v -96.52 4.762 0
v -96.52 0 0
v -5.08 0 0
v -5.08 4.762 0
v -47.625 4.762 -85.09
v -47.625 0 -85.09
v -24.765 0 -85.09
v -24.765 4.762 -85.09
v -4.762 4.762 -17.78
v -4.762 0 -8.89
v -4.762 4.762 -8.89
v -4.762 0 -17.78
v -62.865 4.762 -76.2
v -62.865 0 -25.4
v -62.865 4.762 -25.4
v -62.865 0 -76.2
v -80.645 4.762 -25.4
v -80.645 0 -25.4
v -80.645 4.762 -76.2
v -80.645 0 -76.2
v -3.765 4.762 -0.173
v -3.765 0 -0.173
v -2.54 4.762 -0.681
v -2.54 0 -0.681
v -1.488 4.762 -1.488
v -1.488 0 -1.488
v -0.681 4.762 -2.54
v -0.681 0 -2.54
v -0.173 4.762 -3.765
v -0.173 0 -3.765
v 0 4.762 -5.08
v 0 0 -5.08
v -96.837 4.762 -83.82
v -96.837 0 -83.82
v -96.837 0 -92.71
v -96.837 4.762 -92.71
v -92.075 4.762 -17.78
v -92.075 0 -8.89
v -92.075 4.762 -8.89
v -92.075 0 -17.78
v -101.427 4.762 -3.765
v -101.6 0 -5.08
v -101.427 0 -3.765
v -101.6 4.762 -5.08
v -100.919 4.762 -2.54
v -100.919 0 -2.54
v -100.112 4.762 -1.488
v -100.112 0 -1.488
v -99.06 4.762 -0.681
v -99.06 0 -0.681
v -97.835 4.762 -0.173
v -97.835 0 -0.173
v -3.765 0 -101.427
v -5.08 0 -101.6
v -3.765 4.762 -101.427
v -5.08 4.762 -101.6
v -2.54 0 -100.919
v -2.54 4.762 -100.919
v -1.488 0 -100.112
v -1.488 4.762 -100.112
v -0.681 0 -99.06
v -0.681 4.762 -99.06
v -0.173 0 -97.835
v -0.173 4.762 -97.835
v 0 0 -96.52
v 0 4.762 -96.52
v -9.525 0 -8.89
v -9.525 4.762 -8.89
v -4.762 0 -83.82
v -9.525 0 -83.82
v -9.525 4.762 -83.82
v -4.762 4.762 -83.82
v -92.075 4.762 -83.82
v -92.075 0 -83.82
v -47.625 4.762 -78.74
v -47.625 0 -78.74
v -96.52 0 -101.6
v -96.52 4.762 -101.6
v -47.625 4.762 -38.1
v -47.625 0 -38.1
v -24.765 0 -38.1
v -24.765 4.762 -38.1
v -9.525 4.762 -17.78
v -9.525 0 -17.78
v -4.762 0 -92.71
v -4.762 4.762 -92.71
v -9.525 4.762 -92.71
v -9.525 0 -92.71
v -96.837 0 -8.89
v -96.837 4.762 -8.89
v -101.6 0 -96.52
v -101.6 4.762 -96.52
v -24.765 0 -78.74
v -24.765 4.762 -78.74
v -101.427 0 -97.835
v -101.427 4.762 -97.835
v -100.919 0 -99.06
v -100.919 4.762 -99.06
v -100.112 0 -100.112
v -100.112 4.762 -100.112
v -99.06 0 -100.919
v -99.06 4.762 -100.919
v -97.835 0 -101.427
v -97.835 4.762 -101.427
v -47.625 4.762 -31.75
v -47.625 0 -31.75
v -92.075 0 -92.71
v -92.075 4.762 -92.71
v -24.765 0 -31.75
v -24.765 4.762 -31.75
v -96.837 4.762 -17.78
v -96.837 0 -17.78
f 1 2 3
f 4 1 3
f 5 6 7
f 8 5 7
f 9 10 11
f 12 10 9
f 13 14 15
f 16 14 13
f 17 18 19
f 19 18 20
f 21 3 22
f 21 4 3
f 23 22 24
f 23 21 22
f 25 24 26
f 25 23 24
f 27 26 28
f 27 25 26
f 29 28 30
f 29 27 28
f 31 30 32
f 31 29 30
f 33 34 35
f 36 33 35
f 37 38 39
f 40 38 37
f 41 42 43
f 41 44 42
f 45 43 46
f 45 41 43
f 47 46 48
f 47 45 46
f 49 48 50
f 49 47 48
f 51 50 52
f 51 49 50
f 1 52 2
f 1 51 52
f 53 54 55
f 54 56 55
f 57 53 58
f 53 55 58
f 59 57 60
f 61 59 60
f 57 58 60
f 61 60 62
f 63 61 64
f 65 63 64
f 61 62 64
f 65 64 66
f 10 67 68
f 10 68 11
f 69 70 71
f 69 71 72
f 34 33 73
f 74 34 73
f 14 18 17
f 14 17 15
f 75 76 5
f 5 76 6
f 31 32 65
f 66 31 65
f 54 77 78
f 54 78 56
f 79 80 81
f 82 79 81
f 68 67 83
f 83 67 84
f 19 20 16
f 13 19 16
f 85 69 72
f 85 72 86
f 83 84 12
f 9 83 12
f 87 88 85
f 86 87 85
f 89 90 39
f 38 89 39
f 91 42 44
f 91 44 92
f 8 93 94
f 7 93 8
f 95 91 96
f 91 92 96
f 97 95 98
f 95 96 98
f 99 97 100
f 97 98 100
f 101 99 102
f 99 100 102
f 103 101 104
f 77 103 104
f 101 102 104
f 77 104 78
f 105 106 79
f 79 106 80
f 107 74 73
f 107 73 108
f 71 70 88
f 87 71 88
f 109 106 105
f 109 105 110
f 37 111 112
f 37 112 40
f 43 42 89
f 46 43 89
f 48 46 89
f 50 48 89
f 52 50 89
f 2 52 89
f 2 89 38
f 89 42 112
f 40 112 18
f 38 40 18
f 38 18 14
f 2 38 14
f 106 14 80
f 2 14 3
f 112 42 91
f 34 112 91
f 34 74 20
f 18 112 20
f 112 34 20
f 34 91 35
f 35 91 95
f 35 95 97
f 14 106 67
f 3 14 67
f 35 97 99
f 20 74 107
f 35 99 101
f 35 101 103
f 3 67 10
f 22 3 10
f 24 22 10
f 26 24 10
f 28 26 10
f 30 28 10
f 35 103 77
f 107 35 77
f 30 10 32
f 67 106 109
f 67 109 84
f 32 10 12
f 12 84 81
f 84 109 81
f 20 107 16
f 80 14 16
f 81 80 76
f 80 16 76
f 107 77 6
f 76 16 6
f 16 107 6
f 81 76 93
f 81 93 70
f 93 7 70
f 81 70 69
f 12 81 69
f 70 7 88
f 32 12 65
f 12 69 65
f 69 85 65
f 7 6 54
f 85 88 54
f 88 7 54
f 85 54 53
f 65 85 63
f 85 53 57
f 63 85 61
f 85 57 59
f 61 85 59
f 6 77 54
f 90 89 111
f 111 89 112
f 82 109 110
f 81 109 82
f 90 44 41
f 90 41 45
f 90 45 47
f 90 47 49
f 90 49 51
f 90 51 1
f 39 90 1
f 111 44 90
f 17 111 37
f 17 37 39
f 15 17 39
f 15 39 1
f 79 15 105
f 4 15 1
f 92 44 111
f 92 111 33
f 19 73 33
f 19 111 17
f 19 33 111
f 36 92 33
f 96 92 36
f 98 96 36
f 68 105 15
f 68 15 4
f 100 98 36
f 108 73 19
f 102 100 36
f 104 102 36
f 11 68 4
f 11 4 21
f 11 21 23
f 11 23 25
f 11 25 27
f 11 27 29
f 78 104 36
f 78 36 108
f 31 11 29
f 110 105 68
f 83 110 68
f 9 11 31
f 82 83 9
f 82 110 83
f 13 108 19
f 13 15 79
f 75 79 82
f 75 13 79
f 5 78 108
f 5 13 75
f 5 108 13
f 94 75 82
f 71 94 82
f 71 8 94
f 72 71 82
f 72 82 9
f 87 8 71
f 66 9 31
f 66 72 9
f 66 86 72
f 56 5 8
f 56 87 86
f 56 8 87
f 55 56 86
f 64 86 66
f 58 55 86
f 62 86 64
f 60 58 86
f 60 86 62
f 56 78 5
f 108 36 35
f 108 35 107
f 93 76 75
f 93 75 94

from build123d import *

# Parameters (mm, degrees)
SKETCH1_W           = 101.6
SKETCH1_H           = 101.6
SKETCH1_W_2         = 4.7625
SKETCH1_H_2         = 8.89
SKETCH1_W_3         = 17.78
SKETCH1_H_3         = 50.8
SKETCH1_W_4         = 22.86
SKETCH1_H_4         = 6.35
BOSS_EXTRUDE1_DEPTH = 4.7625
FILLET1_R           = 5.08


with BuildPart() as part:
    # Sketch1 → Boss-Extrude1 (new body)
    with BuildSketch(Plane(origin=(0, 0, 0), x_dir=(1, 0, 0), z_dir=(0, 1, 0))):
        with Locations((-50.8, 50.8)):
            Rectangle(SKETCH1_W, SKETCH1_H)
        with Locations((-94.45625, 13.335)):
            Rectangle(SKETCH1_W_2, SKETCH1_H_2, mode=Mode.SUBTRACT)
        with Locations((-94.45625, 88.265)):
            Rectangle(SKETCH1_W_2, SKETCH1_H_2, mode=Mode.SUBTRACT)
        with Locations((-71.755, 50.8)):
            Rectangle(SKETCH1_W_3, SKETCH1_H_3, mode=Mode.SUBTRACT)
        with Locations((-36.195, 81.915)):
            Rectangle(SKETCH1_W_4, SKETCH1_H_4, mode=Mode.SUBTRACT)
        with Locations((-7.14375, 13.335)):
            Rectangle(SKETCH1_W_2, SKETCH1_H_2, mode=Mode.SUBTRACT)
        with Locations((-7.14375, 88.265)):
            Rectangle(SKETCH1_W_2, SKETCH1_H_2, mode=Mode.SUBTRACT)
        with Locations((-36.195, 34.925)):
            Rectangle(SKETCH1_W_4, SKETCH1_H_4, mode=Mode.SUBTRACT)
    extrude(amount=BOSS_EXTRUDE1_DEPTH)

    # Fillet1
    fillet1_edges = [part.edges().sort_by_distance(p)[0] for p in [
        (0, 2.38125, 0),
        (-101.6, 2.38125, 0),
        (-101.6, 2.38125, -101.6),
        (0, 2.38125, -101.6),
    ]]
    fillet(fillet1_edges, radius=FILLET1_R)


solid = part.part
